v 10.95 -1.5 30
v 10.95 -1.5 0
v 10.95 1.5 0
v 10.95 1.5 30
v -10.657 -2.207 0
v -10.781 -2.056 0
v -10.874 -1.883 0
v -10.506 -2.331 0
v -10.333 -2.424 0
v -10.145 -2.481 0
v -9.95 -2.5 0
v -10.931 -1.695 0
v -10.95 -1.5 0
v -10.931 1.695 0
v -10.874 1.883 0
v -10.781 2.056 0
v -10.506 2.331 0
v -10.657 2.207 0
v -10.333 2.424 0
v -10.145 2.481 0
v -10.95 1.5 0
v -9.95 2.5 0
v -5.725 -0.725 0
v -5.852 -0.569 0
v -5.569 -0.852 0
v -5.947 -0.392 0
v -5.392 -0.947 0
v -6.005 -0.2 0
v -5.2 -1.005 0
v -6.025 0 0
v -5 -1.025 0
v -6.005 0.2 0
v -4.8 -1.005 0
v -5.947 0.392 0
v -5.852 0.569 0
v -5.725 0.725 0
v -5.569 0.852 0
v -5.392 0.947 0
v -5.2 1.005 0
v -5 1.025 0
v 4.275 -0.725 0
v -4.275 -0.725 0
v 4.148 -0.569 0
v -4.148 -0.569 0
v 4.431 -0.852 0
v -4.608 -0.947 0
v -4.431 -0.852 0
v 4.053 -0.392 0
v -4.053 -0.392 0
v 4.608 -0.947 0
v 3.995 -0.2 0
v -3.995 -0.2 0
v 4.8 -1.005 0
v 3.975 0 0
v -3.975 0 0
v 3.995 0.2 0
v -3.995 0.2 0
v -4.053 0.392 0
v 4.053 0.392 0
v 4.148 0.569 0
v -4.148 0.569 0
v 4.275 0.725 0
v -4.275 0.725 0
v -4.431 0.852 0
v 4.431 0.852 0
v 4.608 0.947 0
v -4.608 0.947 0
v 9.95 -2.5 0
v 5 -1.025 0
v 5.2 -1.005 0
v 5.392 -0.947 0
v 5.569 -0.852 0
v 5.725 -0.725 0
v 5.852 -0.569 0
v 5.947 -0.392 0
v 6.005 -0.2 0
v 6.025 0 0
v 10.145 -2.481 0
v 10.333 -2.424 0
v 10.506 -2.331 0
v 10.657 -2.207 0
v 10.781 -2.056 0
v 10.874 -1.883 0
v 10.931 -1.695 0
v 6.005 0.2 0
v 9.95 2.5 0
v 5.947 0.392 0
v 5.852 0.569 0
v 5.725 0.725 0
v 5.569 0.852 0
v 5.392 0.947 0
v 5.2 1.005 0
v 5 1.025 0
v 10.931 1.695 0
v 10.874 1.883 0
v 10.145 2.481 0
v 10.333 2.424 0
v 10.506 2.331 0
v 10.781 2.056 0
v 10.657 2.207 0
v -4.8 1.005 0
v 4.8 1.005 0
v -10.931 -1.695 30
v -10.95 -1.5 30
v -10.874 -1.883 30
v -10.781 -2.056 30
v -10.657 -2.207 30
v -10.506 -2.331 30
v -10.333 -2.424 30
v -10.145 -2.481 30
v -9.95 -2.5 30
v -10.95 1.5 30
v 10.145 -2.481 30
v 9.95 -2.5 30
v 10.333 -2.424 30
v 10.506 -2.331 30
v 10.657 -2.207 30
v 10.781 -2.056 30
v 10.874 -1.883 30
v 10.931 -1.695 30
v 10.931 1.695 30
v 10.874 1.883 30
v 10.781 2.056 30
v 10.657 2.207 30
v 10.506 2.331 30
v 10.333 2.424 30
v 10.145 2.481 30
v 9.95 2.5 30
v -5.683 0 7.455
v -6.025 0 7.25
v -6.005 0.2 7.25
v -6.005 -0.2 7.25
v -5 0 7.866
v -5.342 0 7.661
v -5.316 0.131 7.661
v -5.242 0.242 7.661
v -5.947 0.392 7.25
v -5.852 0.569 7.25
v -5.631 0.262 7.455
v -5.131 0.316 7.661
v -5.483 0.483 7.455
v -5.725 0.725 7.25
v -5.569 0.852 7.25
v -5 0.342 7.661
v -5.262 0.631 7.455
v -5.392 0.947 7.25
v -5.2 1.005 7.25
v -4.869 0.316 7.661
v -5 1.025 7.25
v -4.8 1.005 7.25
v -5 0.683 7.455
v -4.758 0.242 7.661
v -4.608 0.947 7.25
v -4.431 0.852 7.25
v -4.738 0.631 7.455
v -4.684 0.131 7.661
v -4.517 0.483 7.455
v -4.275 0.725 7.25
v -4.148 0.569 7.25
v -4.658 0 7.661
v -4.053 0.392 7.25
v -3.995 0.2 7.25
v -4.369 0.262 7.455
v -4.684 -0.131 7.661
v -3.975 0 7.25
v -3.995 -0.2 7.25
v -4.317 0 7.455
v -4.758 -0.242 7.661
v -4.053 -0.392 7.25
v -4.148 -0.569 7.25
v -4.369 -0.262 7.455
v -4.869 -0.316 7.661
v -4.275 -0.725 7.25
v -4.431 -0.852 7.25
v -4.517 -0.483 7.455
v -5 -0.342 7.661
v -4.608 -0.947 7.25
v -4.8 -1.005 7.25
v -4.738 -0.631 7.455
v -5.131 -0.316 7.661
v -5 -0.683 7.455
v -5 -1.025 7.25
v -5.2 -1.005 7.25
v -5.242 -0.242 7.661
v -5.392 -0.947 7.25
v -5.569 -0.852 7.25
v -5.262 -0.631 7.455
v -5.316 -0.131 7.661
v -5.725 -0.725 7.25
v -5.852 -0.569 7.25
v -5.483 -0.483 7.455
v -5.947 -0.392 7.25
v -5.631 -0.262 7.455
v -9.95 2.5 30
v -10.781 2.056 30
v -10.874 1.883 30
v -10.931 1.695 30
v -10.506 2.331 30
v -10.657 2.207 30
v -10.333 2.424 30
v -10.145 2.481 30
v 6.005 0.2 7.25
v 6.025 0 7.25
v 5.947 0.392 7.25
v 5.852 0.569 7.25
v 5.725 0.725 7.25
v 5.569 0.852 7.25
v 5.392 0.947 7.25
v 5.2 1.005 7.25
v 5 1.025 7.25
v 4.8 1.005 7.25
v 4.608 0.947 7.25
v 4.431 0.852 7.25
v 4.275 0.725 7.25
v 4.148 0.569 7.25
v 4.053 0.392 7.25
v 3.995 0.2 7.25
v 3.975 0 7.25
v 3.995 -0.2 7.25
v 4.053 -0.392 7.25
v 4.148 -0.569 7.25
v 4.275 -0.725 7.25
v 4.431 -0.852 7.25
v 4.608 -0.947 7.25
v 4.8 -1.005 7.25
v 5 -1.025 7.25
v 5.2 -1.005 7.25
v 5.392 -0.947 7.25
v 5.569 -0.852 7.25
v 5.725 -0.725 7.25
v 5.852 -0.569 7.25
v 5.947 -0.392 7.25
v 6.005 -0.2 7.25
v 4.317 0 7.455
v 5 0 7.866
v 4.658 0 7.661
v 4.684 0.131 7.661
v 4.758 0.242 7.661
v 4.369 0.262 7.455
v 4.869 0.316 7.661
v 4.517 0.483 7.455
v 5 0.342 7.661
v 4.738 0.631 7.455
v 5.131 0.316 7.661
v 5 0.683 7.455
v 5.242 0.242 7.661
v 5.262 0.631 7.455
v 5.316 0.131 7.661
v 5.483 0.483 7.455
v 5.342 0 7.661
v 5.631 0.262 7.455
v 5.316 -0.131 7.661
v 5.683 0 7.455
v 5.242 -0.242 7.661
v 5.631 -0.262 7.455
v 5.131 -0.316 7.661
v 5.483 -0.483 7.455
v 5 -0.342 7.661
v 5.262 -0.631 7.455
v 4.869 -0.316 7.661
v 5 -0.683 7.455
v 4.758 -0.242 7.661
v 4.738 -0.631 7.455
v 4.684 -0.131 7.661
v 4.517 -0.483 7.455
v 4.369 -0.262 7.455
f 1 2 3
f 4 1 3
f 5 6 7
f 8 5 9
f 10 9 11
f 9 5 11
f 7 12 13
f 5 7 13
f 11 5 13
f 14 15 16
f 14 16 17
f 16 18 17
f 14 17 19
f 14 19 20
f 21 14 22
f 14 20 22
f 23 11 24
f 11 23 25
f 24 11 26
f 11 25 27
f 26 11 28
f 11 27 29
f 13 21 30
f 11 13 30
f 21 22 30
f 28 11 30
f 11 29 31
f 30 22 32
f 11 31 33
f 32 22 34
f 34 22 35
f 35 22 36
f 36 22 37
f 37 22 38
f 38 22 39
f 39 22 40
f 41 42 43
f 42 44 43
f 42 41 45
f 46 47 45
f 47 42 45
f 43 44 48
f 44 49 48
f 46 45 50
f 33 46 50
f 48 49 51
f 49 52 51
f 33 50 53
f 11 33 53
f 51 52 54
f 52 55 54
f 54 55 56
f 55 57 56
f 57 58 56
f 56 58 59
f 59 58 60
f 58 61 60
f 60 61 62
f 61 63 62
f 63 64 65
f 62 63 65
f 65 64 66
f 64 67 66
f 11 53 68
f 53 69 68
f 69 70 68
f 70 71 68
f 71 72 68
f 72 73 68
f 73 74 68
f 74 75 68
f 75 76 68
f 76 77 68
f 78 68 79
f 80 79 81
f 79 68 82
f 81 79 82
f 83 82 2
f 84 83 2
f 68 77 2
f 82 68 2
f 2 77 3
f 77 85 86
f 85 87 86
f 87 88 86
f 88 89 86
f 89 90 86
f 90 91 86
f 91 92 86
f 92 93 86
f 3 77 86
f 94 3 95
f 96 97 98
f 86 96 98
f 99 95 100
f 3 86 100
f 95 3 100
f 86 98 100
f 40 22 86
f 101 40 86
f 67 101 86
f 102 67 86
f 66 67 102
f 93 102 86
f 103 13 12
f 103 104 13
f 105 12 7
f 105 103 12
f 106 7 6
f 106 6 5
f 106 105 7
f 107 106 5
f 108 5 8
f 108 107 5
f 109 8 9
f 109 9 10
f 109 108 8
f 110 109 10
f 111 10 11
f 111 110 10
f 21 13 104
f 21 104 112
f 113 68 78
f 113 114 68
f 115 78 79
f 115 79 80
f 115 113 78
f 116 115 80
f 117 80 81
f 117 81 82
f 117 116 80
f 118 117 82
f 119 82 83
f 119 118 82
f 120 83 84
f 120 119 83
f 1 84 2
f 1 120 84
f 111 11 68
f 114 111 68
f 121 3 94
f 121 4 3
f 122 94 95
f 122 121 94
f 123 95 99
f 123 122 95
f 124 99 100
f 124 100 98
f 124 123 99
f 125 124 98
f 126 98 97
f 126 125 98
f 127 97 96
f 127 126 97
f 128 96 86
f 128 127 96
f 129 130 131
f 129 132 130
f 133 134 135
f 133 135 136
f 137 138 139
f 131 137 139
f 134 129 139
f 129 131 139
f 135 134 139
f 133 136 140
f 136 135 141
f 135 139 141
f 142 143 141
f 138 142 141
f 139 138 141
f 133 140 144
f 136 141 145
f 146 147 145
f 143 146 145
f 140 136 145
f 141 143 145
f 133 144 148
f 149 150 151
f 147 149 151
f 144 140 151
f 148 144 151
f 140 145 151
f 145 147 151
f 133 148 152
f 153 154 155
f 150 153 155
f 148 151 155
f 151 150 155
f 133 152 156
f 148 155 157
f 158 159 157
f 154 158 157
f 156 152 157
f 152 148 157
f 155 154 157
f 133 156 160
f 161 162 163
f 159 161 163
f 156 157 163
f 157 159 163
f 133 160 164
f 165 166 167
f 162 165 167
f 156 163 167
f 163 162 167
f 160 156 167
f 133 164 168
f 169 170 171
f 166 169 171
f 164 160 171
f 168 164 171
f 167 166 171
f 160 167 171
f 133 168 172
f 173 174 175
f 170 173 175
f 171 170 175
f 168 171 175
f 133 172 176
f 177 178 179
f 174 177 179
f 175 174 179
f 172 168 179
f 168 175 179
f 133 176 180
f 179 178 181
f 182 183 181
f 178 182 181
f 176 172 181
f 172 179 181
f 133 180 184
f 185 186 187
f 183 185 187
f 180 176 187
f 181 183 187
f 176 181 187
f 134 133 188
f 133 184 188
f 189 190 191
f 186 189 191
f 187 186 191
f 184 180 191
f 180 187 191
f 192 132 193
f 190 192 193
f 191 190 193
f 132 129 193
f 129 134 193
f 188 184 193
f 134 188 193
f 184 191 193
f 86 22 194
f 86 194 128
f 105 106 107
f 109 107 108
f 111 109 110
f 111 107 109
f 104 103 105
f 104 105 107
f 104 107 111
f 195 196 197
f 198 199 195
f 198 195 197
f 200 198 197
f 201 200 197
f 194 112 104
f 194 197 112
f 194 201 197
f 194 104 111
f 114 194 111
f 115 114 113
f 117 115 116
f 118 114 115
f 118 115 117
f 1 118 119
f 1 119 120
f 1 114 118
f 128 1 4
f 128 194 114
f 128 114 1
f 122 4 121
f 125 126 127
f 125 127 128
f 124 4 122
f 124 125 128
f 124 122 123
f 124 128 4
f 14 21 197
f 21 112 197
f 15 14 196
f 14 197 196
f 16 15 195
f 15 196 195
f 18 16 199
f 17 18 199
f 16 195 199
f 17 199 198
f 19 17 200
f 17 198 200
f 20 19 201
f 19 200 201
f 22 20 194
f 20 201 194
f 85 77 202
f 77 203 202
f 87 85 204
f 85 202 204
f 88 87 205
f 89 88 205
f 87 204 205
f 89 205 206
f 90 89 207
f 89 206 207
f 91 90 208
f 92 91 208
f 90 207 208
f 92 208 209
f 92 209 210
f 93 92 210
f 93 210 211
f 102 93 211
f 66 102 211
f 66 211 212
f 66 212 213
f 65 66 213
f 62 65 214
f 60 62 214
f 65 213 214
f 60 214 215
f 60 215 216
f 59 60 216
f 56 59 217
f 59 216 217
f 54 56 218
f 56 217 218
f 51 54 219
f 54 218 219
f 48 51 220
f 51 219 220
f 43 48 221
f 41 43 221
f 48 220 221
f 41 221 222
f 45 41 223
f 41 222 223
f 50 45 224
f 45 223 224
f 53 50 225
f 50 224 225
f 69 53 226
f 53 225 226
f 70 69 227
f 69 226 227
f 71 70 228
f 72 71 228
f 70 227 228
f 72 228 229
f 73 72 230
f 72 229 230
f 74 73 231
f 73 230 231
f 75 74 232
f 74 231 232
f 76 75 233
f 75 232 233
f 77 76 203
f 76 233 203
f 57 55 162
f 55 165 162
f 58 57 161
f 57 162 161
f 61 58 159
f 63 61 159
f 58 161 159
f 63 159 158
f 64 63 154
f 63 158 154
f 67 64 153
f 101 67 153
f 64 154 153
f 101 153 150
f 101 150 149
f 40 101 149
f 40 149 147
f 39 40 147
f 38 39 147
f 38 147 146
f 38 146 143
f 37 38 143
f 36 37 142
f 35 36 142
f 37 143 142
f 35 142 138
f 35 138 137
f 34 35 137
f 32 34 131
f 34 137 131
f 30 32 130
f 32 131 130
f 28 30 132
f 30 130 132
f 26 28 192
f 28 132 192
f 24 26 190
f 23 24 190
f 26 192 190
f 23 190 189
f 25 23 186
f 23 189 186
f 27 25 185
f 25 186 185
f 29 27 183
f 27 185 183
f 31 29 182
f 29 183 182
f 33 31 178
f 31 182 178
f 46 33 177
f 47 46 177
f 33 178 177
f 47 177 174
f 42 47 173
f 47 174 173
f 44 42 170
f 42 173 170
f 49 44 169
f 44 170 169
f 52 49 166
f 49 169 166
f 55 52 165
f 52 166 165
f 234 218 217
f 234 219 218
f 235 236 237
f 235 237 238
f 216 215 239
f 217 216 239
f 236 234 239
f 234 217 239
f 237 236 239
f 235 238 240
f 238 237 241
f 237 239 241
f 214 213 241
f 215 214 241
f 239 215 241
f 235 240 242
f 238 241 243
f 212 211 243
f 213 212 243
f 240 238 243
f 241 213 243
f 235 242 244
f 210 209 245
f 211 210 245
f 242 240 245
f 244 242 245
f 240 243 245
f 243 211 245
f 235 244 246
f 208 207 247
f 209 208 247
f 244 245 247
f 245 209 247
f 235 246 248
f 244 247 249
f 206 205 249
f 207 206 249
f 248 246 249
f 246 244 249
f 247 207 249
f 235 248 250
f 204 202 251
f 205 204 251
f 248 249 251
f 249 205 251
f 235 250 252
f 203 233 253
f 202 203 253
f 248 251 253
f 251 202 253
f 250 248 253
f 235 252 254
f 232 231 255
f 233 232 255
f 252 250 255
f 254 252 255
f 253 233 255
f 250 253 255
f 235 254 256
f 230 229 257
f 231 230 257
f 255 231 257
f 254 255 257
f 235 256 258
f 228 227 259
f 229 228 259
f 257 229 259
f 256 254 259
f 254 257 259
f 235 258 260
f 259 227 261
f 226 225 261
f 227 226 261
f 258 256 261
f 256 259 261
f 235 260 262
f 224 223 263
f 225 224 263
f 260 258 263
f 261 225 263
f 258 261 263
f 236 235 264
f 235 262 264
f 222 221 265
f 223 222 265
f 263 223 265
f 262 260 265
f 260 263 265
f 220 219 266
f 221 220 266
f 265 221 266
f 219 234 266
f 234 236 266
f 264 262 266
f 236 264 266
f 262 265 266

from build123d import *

# Parameters (mm, degrees)
SKETCH_1_W               = 21.9
SKETCH_1_H               = 5
EXTRUDE_1_DEPTH          = 30
FILLET_2_R               = 1
HOLE_WIZARD_M2_5_1_D     = 2.05
HOLE_WIZARD_M2_5_1_DEPTH = 7.25
HOLE_WIZARD_M2_5_1_TIP   = 0.615882135


with BuildPart() as part:
    # 草图1 → 凸台-拉伸1 (new body)
    with BuildSketch(Plane.XY):
        Rectangle(SKETCH_1_W, SKETCH_1_H)
    extrude(amount=EXTRUDE_1_DEPTH)

    # 圆角2
    fillet_2_edges = [part.edges().sort_by_distance(p)[0] for p in [
        (10.95, -2.5, 15),
        (-10.95, -2.5, 15),
        (-10.95, 2.5, 15),
        (10.95, 2.5, 15),
    ]]
    fillet(fillet_2_edges, radius=FILLET_2_R)

    # M2.5 螺纹孔1
    with Locations(Plane(origin=(0, 0, 0), x_dir=(-1, 0, 0), z_dir=(0, 0, -1))):
        with Locations((-5, 0), (5, 0)):
            Hole(HOLE_WIZARD_M2_5_1_D / 2, depth=HOLE_WIZARD_M2_5_1_DEPTH)
            with Locations((0, 0, -(HOLE_WIZARD_M2_5_1_DEPTH + HOLE_WIZARD_M2_5_1_TIP / 2))):  # 118° drill point
                Cone(0, HOLE_WIZARD_M2_5_1_D / 2, HOLE_WIZARD_M2_5_1_TIP, mode=Mode.SUBTRACT)


solid = part.part
